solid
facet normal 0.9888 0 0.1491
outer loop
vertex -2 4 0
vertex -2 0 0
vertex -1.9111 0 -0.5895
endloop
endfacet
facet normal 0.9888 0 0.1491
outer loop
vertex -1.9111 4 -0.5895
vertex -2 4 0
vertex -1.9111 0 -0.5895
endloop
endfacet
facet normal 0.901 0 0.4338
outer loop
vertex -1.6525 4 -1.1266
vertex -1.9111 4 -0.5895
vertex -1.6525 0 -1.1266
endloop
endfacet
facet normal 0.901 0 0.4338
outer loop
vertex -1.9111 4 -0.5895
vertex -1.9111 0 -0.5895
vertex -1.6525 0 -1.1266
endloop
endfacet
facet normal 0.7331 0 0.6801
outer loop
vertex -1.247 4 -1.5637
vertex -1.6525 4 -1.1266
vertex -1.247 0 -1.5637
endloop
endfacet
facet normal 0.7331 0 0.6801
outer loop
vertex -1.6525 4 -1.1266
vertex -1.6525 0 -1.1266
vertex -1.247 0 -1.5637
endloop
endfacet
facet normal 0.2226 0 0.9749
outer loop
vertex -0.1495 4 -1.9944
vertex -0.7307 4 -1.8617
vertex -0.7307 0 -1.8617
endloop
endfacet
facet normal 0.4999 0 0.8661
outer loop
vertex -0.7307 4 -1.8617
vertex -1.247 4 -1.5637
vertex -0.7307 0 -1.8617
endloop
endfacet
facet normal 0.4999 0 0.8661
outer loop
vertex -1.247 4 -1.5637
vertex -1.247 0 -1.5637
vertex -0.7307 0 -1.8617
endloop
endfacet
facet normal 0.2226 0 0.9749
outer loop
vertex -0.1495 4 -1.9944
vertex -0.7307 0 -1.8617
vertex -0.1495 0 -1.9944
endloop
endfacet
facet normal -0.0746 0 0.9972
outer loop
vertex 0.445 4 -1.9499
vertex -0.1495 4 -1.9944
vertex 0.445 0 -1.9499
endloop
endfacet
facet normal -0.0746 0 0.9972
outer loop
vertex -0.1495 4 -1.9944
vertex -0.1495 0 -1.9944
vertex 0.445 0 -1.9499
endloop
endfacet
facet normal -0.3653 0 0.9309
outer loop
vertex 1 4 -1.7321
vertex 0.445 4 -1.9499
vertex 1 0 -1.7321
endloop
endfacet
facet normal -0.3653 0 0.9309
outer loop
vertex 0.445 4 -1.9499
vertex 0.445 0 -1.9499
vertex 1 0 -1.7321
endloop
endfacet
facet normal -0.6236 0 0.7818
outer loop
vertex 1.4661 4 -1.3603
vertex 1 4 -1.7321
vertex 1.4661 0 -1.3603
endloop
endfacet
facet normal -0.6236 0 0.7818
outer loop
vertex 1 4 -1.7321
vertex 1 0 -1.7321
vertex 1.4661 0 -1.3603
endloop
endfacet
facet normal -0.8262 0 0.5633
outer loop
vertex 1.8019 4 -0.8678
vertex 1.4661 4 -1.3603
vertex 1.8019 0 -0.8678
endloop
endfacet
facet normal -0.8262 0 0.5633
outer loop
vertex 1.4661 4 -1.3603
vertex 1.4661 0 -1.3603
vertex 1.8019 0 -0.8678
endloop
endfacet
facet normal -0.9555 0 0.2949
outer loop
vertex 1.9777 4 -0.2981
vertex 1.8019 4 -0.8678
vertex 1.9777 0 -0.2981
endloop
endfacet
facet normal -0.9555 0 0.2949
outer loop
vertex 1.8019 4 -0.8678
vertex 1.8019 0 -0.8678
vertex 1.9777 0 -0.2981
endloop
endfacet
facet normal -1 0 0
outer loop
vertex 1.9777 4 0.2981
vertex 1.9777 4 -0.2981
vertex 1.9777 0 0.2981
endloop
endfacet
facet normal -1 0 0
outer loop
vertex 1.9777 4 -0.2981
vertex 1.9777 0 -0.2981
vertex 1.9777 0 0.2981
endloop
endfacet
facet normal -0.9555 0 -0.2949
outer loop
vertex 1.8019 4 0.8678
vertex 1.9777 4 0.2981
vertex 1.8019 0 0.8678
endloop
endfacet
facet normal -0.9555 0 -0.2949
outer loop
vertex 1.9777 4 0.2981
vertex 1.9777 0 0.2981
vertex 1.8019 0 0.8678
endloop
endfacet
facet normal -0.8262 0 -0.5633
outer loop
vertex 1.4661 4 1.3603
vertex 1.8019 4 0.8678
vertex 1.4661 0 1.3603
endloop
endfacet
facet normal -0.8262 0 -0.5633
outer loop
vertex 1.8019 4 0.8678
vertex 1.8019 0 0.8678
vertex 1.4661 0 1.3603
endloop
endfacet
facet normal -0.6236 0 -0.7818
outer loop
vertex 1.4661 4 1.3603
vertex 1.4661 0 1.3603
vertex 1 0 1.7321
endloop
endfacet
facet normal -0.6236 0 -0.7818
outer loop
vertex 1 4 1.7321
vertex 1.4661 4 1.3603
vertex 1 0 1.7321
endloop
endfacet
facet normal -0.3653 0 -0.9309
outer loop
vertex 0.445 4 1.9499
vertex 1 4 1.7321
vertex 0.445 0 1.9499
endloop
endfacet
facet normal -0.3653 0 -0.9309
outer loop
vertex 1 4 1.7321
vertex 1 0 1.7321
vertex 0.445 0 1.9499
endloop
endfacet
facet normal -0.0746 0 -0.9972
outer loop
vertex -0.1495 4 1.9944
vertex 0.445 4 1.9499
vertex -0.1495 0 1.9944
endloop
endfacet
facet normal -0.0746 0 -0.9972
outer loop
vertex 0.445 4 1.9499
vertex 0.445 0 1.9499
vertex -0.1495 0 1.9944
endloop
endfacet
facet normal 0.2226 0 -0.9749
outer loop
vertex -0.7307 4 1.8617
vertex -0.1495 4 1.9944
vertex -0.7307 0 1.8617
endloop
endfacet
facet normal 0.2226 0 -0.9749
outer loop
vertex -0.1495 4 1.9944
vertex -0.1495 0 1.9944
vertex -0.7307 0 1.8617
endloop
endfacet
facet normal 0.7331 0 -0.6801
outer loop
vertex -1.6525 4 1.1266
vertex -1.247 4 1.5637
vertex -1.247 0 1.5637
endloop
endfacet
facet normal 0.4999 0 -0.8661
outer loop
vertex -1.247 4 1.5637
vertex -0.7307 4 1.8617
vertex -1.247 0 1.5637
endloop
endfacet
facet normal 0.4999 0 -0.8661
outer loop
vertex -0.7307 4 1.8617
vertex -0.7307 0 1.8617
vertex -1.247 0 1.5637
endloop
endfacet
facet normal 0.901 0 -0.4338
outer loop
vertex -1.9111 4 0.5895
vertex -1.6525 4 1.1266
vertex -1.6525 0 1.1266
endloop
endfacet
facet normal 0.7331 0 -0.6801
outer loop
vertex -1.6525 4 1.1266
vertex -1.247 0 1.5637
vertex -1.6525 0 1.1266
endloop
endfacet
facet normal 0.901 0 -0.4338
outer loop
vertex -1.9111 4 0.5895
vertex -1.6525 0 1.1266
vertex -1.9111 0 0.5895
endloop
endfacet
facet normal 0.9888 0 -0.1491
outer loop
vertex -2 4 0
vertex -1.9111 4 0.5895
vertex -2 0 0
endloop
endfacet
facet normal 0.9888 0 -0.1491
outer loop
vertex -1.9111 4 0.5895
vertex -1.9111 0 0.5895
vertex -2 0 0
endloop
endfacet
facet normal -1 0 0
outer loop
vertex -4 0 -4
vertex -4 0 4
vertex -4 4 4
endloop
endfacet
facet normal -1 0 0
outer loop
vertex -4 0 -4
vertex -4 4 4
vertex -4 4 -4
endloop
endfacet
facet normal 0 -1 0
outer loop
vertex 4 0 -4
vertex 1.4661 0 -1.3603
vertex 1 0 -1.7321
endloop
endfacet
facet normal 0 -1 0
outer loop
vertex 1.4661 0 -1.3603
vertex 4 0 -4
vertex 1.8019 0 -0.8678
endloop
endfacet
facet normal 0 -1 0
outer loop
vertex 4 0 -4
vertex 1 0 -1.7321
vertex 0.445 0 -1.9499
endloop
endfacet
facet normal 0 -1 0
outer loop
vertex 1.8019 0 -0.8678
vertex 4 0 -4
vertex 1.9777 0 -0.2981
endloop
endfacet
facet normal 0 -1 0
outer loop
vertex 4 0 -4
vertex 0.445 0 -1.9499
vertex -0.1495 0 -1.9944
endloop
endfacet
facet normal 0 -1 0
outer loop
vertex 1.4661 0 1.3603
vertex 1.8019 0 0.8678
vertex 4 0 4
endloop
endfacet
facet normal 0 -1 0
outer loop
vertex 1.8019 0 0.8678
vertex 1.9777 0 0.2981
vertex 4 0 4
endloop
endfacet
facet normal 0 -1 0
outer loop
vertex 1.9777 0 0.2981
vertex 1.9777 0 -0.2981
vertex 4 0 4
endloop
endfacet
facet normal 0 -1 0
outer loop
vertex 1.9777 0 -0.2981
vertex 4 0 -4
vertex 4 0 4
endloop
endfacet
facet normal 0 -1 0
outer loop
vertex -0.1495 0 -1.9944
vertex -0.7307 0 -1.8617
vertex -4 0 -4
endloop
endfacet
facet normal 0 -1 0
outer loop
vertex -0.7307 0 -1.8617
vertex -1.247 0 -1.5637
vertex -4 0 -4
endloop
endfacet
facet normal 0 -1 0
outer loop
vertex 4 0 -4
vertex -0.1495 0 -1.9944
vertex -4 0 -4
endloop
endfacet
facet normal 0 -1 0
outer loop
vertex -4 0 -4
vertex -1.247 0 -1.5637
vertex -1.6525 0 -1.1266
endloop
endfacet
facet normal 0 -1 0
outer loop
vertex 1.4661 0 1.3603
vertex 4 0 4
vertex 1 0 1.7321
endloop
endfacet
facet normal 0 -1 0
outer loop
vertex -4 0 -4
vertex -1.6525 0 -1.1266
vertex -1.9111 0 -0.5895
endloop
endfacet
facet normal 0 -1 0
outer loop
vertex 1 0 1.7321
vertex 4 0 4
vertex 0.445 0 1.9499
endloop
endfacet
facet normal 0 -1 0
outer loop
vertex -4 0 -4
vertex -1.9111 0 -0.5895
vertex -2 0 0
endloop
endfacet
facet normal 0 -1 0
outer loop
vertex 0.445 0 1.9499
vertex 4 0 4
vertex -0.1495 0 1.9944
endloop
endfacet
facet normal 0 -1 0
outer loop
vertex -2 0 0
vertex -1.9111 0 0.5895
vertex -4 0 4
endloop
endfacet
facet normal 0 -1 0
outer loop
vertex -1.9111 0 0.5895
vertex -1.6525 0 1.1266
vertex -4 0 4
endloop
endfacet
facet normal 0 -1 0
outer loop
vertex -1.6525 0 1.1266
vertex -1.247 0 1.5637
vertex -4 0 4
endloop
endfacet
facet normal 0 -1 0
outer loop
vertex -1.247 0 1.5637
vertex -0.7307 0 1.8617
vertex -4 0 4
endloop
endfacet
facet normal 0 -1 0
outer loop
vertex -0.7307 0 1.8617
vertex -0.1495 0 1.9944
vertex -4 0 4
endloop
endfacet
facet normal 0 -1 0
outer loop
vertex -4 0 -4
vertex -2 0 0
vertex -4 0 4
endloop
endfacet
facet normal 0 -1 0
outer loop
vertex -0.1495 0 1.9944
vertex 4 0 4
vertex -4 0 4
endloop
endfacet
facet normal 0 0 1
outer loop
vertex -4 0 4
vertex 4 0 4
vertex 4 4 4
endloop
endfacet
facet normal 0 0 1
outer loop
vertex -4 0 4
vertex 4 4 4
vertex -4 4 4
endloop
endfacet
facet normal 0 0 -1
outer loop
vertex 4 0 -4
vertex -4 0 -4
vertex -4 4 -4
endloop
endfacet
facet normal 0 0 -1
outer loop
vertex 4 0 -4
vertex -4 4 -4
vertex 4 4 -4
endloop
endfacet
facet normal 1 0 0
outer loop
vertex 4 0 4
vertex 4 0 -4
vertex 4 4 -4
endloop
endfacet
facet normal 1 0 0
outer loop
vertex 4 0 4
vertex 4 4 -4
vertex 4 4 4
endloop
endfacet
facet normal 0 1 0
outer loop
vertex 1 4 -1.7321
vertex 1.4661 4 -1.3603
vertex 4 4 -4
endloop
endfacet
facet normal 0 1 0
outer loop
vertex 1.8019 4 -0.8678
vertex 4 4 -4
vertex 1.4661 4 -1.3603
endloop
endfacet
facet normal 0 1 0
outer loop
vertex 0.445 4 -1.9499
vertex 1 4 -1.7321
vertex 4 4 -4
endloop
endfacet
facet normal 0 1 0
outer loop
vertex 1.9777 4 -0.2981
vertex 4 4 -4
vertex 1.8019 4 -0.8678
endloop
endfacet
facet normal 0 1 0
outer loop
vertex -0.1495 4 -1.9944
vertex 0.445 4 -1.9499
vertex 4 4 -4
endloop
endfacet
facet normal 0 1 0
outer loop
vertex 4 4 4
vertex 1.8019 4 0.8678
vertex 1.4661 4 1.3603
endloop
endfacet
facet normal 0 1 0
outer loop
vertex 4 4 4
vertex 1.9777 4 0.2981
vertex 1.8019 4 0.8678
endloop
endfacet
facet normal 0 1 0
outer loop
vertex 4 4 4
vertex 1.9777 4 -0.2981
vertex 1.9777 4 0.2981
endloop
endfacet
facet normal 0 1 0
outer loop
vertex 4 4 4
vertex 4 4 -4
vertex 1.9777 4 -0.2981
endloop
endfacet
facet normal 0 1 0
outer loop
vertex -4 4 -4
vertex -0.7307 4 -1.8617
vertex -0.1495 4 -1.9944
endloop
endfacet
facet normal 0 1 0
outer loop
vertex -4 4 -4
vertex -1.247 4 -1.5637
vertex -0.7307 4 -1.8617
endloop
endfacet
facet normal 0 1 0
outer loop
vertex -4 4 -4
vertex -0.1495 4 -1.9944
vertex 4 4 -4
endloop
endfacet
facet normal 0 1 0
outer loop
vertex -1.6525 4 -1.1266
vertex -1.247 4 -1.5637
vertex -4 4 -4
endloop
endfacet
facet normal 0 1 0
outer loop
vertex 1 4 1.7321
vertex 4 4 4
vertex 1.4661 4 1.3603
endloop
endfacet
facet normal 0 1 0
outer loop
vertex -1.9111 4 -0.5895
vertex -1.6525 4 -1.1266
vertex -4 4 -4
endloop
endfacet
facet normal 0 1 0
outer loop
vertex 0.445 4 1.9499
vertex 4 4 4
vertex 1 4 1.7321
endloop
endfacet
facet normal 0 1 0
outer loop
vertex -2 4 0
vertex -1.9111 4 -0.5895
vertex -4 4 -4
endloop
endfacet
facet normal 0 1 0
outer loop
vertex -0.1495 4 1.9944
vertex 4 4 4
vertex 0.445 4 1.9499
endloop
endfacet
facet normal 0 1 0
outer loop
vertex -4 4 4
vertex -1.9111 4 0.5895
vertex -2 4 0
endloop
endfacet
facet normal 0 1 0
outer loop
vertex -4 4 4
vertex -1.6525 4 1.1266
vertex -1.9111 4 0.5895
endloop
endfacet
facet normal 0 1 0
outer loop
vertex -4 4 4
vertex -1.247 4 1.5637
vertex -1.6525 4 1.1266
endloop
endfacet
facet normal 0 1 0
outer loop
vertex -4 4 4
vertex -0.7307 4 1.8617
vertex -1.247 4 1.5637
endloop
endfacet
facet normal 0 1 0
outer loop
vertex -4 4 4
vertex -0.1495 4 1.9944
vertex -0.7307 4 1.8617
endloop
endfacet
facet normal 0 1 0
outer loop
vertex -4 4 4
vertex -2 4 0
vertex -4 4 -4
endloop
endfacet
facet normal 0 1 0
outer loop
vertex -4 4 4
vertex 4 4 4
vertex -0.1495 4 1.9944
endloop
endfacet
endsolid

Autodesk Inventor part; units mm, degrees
ref_plane "YZ Plane" through (0, 0, 0) normal (1, 0, 0) x (0, 1, 0)
ref_plane "XZ Plane" through (0, 0, 0) normal (0, 1, 0) x (-1, 0, 0)
ref_plane "XY Plane" through (0, 0, 0) normal (0, 0, 1) x (1, 0, 0)
sketch "Sketch1" plane through (0, 0, 0) normal (0, 1, 0) x (-1, 0, 0)
  line L0 (-4, 4) -> (4, 4)
  line L1 (4, 4) -> (4, -4)
  line L2 (4, -4) -> (-4, -4)
  line L3 (-4, -4) -> (-4, 4)
  line L4 (-4, 4) -> (4, -4) construction
  line L5 (4, 4) -> (-4, -4) construction
  circle A0 centre (0, 0) radius 2
  dimension "d0" = 8
  dimension "d1" = 8
  dimension "d2" = 4
extrude "Extrusion1" add sketch "Sketch1" along normal blind 4
thread "Thread1" size "M4x0.7" class "6H" standard "ISO Metric profile" length 6
properties part number "Ganjal Baut Kutup" material "Copper"
